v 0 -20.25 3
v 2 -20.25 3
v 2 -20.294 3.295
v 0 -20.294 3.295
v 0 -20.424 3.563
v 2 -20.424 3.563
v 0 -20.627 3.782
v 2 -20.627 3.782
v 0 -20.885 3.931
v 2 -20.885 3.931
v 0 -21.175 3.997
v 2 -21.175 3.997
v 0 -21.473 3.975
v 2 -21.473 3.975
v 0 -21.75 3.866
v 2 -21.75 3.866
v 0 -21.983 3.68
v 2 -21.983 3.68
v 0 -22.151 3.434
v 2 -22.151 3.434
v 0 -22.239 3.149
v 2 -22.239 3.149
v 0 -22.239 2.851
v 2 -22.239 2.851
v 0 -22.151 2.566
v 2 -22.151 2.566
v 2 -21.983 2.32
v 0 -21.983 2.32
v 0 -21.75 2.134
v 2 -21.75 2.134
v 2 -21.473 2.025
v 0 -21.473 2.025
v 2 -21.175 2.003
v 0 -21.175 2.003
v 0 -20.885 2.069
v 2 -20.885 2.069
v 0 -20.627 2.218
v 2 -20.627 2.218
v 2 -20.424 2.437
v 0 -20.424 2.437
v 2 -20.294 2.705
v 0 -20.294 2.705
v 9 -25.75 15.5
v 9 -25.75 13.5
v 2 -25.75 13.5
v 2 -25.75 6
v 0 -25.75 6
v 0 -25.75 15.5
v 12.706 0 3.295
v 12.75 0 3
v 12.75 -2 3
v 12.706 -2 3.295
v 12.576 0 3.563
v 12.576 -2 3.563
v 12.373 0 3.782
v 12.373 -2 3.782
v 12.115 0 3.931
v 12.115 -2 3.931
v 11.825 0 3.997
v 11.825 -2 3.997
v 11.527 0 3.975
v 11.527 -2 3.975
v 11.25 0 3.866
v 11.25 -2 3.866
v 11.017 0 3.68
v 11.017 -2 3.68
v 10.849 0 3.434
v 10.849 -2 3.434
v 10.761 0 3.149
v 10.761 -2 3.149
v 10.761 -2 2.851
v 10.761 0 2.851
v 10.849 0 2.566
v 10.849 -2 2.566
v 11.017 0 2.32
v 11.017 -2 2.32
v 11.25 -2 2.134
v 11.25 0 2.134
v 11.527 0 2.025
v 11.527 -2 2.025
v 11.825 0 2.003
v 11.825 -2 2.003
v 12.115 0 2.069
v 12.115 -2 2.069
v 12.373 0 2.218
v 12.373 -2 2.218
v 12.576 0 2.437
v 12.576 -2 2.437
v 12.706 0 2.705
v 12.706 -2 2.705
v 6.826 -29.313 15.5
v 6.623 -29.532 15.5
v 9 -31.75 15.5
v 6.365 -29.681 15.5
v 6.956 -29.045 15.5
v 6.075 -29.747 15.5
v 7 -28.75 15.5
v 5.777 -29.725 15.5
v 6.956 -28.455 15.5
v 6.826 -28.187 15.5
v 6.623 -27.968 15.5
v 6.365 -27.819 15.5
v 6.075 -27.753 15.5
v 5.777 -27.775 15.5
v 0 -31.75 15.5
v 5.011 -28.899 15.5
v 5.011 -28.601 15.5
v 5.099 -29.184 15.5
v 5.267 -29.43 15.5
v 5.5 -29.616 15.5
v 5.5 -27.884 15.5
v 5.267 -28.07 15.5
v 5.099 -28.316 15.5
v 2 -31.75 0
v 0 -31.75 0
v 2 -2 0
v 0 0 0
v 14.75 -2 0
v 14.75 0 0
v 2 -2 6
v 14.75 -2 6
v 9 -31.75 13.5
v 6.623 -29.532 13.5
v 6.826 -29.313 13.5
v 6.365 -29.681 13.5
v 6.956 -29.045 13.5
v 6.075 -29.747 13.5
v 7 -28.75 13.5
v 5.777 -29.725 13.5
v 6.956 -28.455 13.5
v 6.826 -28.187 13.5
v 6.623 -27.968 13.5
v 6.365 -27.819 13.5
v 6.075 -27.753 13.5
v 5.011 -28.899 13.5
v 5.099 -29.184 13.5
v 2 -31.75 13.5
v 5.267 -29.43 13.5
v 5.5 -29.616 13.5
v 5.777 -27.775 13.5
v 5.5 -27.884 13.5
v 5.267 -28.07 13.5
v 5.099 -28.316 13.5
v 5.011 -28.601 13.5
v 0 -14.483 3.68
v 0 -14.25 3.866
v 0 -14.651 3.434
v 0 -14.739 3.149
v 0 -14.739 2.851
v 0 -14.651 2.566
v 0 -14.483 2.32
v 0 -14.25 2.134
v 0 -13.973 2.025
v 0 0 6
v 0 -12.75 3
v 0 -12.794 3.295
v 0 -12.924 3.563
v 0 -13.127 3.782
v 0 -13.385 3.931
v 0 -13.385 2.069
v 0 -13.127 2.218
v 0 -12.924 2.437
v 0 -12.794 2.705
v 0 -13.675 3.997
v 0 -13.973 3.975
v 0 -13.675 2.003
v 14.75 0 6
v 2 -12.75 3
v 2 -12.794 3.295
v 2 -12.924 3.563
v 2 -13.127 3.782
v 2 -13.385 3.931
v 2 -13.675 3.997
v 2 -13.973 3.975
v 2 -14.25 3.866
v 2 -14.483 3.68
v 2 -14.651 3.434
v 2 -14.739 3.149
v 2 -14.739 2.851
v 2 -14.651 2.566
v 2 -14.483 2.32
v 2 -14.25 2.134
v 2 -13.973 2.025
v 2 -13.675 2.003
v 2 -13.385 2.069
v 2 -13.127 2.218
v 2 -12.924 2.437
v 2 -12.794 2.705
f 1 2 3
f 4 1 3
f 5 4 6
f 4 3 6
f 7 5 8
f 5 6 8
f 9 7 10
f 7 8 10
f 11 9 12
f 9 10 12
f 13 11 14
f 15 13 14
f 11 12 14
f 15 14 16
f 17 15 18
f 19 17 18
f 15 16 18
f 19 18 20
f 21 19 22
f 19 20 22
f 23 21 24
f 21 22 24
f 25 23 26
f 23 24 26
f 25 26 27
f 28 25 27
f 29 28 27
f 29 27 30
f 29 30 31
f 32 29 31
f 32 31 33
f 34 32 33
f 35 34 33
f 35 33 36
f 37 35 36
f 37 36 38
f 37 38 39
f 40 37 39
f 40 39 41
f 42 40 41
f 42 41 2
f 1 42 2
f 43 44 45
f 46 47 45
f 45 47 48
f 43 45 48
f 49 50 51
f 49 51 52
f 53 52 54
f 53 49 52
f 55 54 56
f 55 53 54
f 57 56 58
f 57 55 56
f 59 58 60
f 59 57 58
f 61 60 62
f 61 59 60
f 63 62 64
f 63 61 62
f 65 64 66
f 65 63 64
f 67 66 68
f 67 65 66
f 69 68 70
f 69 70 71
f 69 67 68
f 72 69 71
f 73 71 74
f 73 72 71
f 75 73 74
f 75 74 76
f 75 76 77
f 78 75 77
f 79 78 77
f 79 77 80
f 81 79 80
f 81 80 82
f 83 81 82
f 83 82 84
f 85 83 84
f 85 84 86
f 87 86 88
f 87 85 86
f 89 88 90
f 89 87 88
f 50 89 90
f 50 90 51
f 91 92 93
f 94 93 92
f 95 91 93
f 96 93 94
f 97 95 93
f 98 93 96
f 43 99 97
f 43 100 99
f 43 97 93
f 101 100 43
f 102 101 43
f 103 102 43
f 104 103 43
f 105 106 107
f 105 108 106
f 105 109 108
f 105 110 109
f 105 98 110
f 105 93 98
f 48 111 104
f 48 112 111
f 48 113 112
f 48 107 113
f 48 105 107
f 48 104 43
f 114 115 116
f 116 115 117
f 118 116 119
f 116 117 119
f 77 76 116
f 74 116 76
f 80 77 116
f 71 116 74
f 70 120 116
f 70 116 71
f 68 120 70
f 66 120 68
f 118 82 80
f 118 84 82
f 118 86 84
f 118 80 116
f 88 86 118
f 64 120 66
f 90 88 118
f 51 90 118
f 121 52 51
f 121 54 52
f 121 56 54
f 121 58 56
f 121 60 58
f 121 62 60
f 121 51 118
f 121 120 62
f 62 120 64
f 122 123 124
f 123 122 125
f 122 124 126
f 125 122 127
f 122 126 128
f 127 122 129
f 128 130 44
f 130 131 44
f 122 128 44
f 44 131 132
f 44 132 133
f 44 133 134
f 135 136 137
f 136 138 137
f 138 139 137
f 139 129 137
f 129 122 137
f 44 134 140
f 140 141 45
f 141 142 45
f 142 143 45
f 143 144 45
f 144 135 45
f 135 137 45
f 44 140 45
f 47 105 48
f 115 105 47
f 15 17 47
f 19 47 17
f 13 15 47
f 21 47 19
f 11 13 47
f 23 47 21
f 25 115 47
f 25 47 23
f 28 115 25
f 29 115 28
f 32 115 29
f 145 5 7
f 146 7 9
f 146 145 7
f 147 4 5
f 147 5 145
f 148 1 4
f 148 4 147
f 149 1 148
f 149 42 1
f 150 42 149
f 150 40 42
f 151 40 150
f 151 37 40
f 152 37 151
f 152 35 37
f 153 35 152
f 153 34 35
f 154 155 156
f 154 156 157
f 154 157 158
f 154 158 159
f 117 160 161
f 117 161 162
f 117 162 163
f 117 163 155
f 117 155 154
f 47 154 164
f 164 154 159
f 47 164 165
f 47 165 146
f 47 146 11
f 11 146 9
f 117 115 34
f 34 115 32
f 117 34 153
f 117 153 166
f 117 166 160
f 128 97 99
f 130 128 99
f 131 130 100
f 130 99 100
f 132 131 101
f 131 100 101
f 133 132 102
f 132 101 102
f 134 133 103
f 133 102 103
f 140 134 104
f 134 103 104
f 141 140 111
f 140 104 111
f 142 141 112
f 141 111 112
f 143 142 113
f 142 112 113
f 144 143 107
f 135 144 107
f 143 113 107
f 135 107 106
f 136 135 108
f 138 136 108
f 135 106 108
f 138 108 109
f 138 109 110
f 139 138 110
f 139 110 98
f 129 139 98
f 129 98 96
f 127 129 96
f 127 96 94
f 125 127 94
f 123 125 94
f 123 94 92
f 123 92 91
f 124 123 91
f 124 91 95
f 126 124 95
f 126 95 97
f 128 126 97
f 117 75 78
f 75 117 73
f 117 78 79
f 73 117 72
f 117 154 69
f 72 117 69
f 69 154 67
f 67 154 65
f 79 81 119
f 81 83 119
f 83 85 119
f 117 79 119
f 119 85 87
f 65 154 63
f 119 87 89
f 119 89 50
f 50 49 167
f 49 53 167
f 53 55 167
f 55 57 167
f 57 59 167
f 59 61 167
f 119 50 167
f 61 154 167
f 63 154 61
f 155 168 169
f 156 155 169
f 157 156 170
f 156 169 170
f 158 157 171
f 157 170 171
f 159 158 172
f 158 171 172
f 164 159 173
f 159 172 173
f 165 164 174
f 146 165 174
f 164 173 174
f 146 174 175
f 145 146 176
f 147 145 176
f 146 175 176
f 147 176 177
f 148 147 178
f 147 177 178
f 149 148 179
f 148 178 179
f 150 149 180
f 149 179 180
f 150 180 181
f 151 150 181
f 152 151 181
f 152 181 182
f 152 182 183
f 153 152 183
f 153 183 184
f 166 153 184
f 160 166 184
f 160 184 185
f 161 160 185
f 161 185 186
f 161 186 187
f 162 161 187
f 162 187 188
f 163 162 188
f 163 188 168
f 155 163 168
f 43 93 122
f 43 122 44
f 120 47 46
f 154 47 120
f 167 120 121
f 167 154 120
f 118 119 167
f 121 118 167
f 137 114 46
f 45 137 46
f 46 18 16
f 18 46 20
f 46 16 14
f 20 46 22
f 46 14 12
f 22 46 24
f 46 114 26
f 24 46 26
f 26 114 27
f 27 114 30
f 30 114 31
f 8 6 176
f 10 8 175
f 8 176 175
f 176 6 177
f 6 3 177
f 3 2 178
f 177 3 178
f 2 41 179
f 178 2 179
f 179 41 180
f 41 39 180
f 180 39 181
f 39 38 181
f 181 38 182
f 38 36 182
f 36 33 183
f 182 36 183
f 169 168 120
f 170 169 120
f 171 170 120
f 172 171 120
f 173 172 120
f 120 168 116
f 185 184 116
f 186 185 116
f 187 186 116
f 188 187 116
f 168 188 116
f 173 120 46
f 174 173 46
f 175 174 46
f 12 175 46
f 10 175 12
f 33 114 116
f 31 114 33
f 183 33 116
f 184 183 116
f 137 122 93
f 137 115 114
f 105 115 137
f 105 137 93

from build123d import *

# Parameters (mm, degrees)
F0_W      = 14.75
F0_H      = 6
F0_R      = 1
F1_DEPTH  = 2
F2_W      = 2
F2_H      = 6
F3_DEPTH  = 14.75
F4_R      = 1
F5_DEPTH  = 25
F6_W      = 2
F6_H      = 6
F7_DEPTH  = 15
F8_R      = 1
F9_DEPTH  = 25
F10_W     = 2
F10_H     = 6
F11_DEPTH = 9.5
F12_W     = 6
F12_H     = 2
F13_DEPTH = 7
F14_R     = 1
F15_DEPTH = 25


with BuildPart() as f1:
    # F0 (on Front) → F1 (new body)
    with BuildSketch(Plane.XZ):
        with Locations((7.375, 3)):
            Rectangle(F0_W, F0_H)
        with Locations((11.75, 3)):
            Circle(F0_R, mode=Mode.SUBTRACT)
    extrude(amount=F1_DEPTH)

    # F2 (on face) → F3 (join)
    with BuildSketch(Plane.XZ.offset(2)):
        with Locations((1, 3)):
            Rectangle(F2_W, F2_H)
    extrude(amount=F3_DEPTH)

    # F4 (on face) → F5 (cut)
    with BuildSketch(Plane.YZ.offset(2)):
        with Locations((-13.75, 3)):
            Circle(F4_R)
    extrude(amount=-F5_DEPTH, mode=Mode.SUBTRACT)

    # F6 (on face) → F7 (join)
    with BuildSketch(Plane.XZ.offset(16.75)):
        with Locations((1, 3)):
            Rectangle(F6_W, F6_H)
    extrude(amount=F7_DEPTH)

    # F8 (on face) → F9 (cut)
    with BuildSketch(Plane.YZ.offset(2)):
        with Locations((-21.25, 3)):
            Circle(F8_R)
    extrude(amount=-F9_DEPTH, mode=Mode.SUBTRACT)

    # F10 (on face) → F11 (join)
    with BuildSketch(Plane.XY.offset(6)):
        with Locations((1, -28.75)):
            Rectangle(F10_W, F10_H)
    extrude(amount=F11_DEPTH)

    # F12 (on face) → F13 (join)
    with BuildSketch(Plane.YZ.offset(2)):
        with Locations((-28.75, 14.5)):
            Rectangle(F12_W, F12_H)
    extrude(amount=F13_DEPTH)

    # F14 (on face) → F15 (cut)
    with BuildSketch(Plane.XY.offset(15.5)):
        with Locations((6, -28.75)):
            Circle(F14_R)
    extrude(amount=-F15_DEPTH, mode=Mode.SUBTRACT)


solid = f1.part
